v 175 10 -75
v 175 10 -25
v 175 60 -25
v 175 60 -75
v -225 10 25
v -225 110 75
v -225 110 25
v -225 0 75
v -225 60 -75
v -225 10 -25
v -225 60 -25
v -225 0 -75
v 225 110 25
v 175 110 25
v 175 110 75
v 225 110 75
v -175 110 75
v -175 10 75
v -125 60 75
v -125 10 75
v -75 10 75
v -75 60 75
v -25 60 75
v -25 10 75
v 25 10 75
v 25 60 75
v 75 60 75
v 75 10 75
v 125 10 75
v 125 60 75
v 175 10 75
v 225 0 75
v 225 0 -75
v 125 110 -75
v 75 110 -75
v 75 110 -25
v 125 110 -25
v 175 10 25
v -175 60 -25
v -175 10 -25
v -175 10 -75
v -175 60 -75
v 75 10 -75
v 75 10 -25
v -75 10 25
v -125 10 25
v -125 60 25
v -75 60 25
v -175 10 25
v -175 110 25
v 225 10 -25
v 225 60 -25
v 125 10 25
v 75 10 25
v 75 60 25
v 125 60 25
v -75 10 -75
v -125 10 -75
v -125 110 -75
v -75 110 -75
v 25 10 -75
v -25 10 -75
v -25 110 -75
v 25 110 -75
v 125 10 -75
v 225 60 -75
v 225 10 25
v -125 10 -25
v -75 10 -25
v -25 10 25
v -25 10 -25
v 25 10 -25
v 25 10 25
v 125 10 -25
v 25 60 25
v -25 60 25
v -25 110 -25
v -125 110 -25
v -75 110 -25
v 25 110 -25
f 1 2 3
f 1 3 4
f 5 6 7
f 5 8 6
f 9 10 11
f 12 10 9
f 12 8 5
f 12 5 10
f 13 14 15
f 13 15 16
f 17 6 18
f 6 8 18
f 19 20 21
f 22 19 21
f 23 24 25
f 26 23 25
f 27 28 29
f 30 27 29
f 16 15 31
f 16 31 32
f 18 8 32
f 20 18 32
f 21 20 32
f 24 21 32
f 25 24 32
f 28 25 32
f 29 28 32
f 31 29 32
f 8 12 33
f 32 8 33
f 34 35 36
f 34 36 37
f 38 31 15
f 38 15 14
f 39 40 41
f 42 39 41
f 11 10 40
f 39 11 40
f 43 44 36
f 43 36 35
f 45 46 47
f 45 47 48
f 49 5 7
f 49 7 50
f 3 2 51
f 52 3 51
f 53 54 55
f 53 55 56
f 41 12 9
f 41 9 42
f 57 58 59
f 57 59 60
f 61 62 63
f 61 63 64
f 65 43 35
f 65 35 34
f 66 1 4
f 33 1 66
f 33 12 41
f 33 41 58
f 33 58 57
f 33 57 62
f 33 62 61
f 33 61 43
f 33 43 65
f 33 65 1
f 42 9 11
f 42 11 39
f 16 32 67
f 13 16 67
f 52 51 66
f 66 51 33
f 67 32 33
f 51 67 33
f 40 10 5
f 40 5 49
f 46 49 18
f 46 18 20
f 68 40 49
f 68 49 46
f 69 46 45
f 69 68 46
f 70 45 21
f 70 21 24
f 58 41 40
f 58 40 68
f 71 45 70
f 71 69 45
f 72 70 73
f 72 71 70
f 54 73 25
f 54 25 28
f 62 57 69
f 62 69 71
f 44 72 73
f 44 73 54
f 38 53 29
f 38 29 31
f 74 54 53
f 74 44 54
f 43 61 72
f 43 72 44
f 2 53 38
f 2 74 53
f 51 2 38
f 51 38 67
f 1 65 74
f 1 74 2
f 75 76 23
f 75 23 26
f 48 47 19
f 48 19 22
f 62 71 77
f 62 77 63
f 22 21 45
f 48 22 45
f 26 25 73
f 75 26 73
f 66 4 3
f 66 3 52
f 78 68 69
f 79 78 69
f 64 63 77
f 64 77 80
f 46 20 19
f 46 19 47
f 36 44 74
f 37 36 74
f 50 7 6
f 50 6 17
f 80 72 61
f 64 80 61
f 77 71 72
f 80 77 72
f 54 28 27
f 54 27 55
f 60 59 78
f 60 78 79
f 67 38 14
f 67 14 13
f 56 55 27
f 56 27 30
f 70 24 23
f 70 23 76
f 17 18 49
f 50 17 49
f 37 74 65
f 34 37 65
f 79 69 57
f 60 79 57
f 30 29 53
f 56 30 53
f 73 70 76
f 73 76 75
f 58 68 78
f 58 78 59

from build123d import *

# Parameters (mm, degrees)
SKETCH2_W           = 50
SKETCH2_H           = 50
BOSS_EXTRUDE4_DEPTH = 10
SKETCH5_W           = 50
SKETCH5_H           = 50
BOSS_EXTRUDE5_DEPTH = 50
SKETCH6_W           = 50
SKETCH6_H           = 50
BOSS_EXTRUDE6_DEPTH = 100
SKETCH7_W           = 50
SKETCH7_H           = 50
BOSS_EXTRUDE7_DEPTH = 100
SKETCH8_W           = 50
SKETCH8_H           = 50
BOSS_EXTRUDE8_DEPTH = 50


with BuildPart() as part:
    # Sketch2 → Boss-Extrude4 (new body)
    with BuildSketch(Plane(origin=(0, 0, 0), x_dir=(1, 0, 0), z_dir=(0, 1, 0))):
        Polygon((-125, 75), (-175, 75), (-175, 25), (-225, 25), (-225, -25), (-175, -25), (-175, -75), (-125, -75), (-125, -25), (-75, -25), (-75, -75), (-25.420673077, -75), (-25.420673077, -25), (24.579326923, -25), (24.579326923, -75), (75, -75), (75, -25), (125, -25), (125, -75), (175, -75), (175, -25), (225, -25), (225, 25), (175, 25), (175, 75), (125, 75), (125, 25), (75, 25), (75, 75), (24.579326923, 75), (24.579326923, 25), (-25.420673077, 25), (-25.420673077, 75), (-75, 75), (-75, 25), (-125, 25), align=None)
        with Locations((-200, -50)):
            Rectangle(SKETCH2_W, SKETCH2_H)
        with Locations((-100, -50)):
            Rectangle(SKETCH2_W, SKETCH2_H)
        with Locations((-200, 50)):
            Rectangle(SKETCH2_W, SKETCH2_H)
        with Locations((-100, 50)):
            Rectangle(SKETCH2_W, SKETCH2_H)
        with Locations((-0.420673077, -50)):
            Rectangle(SKETCH2_W, SKETCH2_H)
        with Locations((-0.420673077, 50)):
            Rectangle(SKETCH2_W, SKETCH2_H)
        with Locations((100, 50)):
            Rectangle(SKETCH2_W, SKETCH2_H)
        with Locations((100, -50)):
            Rectangle(SKETCH2_W, SKETCH2_H)
        with Locations((200, -50)):
            Rectangle(SKETCH2_W, SKETCH2_H)
        with Locations((200, 50)):
            Rectangle(SKETCH2_W, SKETCH2_H)
    extrude(amount=BOSS_EXTRUDE4_DEPTH)

    # Sketch5 → Boss-Extrude5 (add)
    with BuildSketch(Plane(origin=(0, 10, 0), x_dir=(1, 0, 0), z_dir=(0, 1, 0))):
        with Locations((-200, 50)):
            Rectangle(SKETCH5_W, SKETCH5_H)
        with Locations((200, 50)):
            Rectangle(SKETCH5_W, SKETCH5_H)
    extrude(amount=BOSS_EXTRUDE5_DEPTH)

    # Sketch6 → Boss-Extrude6 (add)
    with BuildSketch(Plane(origin=(0, 10, 0), x_dir=(1, 0, 0), z_dir=(0, 1, 0))):
        with Locations((-200, -50)):
            Rectangle(SKETCH6_W, SKETCH6_H)
        with Locations((200, -50)):
            Rectangle(SKETCH6_W, SKETCH6_H)
    extrude(amount=BOSS_EXTRUDE6_DEPTH)

    # Sketch7 → Boss-Extrude7 (add)
    with BuildSketch(Plane(origin=(0, 10, 0), x_dir=(1, 0, 0), z_dir=(0, 1, 0))):
        with Locations((-100, 50)):
            Rectangle(SKETCH7_W, SKETCH7_H)
        with Locations((0, 50)):
            Rectangle(SKETCH7_W, SKETCH7_H)
        with Locations((100, 50)):
            Rectangle(SKETCH7_W, SKETCH7_H)
    extrude(amount=BOSS_EXTRUDE7_DEPTH)

    # Sketch8 → Boss-Extrude8 (add)
    with BuildSketch(Plane(origin=(0, 10, 0), x_dir=(1, 0, 0), z_dir=(0, 1, 0))):
        with Locations((-100, -50)):
            Rectangle(SKETCH8_W, SKETCH8_H)
        with Locations((0, -50)):
            Rectangle(SKETCH8_W, SKETCH8_H)
        with Locations((100, -50)):
            Rectangle(SKETCH8_W, SKETCH8_H)
    extrude(amount=BOSS_EXTRUDE8_DEPTH)


solid = part.part
